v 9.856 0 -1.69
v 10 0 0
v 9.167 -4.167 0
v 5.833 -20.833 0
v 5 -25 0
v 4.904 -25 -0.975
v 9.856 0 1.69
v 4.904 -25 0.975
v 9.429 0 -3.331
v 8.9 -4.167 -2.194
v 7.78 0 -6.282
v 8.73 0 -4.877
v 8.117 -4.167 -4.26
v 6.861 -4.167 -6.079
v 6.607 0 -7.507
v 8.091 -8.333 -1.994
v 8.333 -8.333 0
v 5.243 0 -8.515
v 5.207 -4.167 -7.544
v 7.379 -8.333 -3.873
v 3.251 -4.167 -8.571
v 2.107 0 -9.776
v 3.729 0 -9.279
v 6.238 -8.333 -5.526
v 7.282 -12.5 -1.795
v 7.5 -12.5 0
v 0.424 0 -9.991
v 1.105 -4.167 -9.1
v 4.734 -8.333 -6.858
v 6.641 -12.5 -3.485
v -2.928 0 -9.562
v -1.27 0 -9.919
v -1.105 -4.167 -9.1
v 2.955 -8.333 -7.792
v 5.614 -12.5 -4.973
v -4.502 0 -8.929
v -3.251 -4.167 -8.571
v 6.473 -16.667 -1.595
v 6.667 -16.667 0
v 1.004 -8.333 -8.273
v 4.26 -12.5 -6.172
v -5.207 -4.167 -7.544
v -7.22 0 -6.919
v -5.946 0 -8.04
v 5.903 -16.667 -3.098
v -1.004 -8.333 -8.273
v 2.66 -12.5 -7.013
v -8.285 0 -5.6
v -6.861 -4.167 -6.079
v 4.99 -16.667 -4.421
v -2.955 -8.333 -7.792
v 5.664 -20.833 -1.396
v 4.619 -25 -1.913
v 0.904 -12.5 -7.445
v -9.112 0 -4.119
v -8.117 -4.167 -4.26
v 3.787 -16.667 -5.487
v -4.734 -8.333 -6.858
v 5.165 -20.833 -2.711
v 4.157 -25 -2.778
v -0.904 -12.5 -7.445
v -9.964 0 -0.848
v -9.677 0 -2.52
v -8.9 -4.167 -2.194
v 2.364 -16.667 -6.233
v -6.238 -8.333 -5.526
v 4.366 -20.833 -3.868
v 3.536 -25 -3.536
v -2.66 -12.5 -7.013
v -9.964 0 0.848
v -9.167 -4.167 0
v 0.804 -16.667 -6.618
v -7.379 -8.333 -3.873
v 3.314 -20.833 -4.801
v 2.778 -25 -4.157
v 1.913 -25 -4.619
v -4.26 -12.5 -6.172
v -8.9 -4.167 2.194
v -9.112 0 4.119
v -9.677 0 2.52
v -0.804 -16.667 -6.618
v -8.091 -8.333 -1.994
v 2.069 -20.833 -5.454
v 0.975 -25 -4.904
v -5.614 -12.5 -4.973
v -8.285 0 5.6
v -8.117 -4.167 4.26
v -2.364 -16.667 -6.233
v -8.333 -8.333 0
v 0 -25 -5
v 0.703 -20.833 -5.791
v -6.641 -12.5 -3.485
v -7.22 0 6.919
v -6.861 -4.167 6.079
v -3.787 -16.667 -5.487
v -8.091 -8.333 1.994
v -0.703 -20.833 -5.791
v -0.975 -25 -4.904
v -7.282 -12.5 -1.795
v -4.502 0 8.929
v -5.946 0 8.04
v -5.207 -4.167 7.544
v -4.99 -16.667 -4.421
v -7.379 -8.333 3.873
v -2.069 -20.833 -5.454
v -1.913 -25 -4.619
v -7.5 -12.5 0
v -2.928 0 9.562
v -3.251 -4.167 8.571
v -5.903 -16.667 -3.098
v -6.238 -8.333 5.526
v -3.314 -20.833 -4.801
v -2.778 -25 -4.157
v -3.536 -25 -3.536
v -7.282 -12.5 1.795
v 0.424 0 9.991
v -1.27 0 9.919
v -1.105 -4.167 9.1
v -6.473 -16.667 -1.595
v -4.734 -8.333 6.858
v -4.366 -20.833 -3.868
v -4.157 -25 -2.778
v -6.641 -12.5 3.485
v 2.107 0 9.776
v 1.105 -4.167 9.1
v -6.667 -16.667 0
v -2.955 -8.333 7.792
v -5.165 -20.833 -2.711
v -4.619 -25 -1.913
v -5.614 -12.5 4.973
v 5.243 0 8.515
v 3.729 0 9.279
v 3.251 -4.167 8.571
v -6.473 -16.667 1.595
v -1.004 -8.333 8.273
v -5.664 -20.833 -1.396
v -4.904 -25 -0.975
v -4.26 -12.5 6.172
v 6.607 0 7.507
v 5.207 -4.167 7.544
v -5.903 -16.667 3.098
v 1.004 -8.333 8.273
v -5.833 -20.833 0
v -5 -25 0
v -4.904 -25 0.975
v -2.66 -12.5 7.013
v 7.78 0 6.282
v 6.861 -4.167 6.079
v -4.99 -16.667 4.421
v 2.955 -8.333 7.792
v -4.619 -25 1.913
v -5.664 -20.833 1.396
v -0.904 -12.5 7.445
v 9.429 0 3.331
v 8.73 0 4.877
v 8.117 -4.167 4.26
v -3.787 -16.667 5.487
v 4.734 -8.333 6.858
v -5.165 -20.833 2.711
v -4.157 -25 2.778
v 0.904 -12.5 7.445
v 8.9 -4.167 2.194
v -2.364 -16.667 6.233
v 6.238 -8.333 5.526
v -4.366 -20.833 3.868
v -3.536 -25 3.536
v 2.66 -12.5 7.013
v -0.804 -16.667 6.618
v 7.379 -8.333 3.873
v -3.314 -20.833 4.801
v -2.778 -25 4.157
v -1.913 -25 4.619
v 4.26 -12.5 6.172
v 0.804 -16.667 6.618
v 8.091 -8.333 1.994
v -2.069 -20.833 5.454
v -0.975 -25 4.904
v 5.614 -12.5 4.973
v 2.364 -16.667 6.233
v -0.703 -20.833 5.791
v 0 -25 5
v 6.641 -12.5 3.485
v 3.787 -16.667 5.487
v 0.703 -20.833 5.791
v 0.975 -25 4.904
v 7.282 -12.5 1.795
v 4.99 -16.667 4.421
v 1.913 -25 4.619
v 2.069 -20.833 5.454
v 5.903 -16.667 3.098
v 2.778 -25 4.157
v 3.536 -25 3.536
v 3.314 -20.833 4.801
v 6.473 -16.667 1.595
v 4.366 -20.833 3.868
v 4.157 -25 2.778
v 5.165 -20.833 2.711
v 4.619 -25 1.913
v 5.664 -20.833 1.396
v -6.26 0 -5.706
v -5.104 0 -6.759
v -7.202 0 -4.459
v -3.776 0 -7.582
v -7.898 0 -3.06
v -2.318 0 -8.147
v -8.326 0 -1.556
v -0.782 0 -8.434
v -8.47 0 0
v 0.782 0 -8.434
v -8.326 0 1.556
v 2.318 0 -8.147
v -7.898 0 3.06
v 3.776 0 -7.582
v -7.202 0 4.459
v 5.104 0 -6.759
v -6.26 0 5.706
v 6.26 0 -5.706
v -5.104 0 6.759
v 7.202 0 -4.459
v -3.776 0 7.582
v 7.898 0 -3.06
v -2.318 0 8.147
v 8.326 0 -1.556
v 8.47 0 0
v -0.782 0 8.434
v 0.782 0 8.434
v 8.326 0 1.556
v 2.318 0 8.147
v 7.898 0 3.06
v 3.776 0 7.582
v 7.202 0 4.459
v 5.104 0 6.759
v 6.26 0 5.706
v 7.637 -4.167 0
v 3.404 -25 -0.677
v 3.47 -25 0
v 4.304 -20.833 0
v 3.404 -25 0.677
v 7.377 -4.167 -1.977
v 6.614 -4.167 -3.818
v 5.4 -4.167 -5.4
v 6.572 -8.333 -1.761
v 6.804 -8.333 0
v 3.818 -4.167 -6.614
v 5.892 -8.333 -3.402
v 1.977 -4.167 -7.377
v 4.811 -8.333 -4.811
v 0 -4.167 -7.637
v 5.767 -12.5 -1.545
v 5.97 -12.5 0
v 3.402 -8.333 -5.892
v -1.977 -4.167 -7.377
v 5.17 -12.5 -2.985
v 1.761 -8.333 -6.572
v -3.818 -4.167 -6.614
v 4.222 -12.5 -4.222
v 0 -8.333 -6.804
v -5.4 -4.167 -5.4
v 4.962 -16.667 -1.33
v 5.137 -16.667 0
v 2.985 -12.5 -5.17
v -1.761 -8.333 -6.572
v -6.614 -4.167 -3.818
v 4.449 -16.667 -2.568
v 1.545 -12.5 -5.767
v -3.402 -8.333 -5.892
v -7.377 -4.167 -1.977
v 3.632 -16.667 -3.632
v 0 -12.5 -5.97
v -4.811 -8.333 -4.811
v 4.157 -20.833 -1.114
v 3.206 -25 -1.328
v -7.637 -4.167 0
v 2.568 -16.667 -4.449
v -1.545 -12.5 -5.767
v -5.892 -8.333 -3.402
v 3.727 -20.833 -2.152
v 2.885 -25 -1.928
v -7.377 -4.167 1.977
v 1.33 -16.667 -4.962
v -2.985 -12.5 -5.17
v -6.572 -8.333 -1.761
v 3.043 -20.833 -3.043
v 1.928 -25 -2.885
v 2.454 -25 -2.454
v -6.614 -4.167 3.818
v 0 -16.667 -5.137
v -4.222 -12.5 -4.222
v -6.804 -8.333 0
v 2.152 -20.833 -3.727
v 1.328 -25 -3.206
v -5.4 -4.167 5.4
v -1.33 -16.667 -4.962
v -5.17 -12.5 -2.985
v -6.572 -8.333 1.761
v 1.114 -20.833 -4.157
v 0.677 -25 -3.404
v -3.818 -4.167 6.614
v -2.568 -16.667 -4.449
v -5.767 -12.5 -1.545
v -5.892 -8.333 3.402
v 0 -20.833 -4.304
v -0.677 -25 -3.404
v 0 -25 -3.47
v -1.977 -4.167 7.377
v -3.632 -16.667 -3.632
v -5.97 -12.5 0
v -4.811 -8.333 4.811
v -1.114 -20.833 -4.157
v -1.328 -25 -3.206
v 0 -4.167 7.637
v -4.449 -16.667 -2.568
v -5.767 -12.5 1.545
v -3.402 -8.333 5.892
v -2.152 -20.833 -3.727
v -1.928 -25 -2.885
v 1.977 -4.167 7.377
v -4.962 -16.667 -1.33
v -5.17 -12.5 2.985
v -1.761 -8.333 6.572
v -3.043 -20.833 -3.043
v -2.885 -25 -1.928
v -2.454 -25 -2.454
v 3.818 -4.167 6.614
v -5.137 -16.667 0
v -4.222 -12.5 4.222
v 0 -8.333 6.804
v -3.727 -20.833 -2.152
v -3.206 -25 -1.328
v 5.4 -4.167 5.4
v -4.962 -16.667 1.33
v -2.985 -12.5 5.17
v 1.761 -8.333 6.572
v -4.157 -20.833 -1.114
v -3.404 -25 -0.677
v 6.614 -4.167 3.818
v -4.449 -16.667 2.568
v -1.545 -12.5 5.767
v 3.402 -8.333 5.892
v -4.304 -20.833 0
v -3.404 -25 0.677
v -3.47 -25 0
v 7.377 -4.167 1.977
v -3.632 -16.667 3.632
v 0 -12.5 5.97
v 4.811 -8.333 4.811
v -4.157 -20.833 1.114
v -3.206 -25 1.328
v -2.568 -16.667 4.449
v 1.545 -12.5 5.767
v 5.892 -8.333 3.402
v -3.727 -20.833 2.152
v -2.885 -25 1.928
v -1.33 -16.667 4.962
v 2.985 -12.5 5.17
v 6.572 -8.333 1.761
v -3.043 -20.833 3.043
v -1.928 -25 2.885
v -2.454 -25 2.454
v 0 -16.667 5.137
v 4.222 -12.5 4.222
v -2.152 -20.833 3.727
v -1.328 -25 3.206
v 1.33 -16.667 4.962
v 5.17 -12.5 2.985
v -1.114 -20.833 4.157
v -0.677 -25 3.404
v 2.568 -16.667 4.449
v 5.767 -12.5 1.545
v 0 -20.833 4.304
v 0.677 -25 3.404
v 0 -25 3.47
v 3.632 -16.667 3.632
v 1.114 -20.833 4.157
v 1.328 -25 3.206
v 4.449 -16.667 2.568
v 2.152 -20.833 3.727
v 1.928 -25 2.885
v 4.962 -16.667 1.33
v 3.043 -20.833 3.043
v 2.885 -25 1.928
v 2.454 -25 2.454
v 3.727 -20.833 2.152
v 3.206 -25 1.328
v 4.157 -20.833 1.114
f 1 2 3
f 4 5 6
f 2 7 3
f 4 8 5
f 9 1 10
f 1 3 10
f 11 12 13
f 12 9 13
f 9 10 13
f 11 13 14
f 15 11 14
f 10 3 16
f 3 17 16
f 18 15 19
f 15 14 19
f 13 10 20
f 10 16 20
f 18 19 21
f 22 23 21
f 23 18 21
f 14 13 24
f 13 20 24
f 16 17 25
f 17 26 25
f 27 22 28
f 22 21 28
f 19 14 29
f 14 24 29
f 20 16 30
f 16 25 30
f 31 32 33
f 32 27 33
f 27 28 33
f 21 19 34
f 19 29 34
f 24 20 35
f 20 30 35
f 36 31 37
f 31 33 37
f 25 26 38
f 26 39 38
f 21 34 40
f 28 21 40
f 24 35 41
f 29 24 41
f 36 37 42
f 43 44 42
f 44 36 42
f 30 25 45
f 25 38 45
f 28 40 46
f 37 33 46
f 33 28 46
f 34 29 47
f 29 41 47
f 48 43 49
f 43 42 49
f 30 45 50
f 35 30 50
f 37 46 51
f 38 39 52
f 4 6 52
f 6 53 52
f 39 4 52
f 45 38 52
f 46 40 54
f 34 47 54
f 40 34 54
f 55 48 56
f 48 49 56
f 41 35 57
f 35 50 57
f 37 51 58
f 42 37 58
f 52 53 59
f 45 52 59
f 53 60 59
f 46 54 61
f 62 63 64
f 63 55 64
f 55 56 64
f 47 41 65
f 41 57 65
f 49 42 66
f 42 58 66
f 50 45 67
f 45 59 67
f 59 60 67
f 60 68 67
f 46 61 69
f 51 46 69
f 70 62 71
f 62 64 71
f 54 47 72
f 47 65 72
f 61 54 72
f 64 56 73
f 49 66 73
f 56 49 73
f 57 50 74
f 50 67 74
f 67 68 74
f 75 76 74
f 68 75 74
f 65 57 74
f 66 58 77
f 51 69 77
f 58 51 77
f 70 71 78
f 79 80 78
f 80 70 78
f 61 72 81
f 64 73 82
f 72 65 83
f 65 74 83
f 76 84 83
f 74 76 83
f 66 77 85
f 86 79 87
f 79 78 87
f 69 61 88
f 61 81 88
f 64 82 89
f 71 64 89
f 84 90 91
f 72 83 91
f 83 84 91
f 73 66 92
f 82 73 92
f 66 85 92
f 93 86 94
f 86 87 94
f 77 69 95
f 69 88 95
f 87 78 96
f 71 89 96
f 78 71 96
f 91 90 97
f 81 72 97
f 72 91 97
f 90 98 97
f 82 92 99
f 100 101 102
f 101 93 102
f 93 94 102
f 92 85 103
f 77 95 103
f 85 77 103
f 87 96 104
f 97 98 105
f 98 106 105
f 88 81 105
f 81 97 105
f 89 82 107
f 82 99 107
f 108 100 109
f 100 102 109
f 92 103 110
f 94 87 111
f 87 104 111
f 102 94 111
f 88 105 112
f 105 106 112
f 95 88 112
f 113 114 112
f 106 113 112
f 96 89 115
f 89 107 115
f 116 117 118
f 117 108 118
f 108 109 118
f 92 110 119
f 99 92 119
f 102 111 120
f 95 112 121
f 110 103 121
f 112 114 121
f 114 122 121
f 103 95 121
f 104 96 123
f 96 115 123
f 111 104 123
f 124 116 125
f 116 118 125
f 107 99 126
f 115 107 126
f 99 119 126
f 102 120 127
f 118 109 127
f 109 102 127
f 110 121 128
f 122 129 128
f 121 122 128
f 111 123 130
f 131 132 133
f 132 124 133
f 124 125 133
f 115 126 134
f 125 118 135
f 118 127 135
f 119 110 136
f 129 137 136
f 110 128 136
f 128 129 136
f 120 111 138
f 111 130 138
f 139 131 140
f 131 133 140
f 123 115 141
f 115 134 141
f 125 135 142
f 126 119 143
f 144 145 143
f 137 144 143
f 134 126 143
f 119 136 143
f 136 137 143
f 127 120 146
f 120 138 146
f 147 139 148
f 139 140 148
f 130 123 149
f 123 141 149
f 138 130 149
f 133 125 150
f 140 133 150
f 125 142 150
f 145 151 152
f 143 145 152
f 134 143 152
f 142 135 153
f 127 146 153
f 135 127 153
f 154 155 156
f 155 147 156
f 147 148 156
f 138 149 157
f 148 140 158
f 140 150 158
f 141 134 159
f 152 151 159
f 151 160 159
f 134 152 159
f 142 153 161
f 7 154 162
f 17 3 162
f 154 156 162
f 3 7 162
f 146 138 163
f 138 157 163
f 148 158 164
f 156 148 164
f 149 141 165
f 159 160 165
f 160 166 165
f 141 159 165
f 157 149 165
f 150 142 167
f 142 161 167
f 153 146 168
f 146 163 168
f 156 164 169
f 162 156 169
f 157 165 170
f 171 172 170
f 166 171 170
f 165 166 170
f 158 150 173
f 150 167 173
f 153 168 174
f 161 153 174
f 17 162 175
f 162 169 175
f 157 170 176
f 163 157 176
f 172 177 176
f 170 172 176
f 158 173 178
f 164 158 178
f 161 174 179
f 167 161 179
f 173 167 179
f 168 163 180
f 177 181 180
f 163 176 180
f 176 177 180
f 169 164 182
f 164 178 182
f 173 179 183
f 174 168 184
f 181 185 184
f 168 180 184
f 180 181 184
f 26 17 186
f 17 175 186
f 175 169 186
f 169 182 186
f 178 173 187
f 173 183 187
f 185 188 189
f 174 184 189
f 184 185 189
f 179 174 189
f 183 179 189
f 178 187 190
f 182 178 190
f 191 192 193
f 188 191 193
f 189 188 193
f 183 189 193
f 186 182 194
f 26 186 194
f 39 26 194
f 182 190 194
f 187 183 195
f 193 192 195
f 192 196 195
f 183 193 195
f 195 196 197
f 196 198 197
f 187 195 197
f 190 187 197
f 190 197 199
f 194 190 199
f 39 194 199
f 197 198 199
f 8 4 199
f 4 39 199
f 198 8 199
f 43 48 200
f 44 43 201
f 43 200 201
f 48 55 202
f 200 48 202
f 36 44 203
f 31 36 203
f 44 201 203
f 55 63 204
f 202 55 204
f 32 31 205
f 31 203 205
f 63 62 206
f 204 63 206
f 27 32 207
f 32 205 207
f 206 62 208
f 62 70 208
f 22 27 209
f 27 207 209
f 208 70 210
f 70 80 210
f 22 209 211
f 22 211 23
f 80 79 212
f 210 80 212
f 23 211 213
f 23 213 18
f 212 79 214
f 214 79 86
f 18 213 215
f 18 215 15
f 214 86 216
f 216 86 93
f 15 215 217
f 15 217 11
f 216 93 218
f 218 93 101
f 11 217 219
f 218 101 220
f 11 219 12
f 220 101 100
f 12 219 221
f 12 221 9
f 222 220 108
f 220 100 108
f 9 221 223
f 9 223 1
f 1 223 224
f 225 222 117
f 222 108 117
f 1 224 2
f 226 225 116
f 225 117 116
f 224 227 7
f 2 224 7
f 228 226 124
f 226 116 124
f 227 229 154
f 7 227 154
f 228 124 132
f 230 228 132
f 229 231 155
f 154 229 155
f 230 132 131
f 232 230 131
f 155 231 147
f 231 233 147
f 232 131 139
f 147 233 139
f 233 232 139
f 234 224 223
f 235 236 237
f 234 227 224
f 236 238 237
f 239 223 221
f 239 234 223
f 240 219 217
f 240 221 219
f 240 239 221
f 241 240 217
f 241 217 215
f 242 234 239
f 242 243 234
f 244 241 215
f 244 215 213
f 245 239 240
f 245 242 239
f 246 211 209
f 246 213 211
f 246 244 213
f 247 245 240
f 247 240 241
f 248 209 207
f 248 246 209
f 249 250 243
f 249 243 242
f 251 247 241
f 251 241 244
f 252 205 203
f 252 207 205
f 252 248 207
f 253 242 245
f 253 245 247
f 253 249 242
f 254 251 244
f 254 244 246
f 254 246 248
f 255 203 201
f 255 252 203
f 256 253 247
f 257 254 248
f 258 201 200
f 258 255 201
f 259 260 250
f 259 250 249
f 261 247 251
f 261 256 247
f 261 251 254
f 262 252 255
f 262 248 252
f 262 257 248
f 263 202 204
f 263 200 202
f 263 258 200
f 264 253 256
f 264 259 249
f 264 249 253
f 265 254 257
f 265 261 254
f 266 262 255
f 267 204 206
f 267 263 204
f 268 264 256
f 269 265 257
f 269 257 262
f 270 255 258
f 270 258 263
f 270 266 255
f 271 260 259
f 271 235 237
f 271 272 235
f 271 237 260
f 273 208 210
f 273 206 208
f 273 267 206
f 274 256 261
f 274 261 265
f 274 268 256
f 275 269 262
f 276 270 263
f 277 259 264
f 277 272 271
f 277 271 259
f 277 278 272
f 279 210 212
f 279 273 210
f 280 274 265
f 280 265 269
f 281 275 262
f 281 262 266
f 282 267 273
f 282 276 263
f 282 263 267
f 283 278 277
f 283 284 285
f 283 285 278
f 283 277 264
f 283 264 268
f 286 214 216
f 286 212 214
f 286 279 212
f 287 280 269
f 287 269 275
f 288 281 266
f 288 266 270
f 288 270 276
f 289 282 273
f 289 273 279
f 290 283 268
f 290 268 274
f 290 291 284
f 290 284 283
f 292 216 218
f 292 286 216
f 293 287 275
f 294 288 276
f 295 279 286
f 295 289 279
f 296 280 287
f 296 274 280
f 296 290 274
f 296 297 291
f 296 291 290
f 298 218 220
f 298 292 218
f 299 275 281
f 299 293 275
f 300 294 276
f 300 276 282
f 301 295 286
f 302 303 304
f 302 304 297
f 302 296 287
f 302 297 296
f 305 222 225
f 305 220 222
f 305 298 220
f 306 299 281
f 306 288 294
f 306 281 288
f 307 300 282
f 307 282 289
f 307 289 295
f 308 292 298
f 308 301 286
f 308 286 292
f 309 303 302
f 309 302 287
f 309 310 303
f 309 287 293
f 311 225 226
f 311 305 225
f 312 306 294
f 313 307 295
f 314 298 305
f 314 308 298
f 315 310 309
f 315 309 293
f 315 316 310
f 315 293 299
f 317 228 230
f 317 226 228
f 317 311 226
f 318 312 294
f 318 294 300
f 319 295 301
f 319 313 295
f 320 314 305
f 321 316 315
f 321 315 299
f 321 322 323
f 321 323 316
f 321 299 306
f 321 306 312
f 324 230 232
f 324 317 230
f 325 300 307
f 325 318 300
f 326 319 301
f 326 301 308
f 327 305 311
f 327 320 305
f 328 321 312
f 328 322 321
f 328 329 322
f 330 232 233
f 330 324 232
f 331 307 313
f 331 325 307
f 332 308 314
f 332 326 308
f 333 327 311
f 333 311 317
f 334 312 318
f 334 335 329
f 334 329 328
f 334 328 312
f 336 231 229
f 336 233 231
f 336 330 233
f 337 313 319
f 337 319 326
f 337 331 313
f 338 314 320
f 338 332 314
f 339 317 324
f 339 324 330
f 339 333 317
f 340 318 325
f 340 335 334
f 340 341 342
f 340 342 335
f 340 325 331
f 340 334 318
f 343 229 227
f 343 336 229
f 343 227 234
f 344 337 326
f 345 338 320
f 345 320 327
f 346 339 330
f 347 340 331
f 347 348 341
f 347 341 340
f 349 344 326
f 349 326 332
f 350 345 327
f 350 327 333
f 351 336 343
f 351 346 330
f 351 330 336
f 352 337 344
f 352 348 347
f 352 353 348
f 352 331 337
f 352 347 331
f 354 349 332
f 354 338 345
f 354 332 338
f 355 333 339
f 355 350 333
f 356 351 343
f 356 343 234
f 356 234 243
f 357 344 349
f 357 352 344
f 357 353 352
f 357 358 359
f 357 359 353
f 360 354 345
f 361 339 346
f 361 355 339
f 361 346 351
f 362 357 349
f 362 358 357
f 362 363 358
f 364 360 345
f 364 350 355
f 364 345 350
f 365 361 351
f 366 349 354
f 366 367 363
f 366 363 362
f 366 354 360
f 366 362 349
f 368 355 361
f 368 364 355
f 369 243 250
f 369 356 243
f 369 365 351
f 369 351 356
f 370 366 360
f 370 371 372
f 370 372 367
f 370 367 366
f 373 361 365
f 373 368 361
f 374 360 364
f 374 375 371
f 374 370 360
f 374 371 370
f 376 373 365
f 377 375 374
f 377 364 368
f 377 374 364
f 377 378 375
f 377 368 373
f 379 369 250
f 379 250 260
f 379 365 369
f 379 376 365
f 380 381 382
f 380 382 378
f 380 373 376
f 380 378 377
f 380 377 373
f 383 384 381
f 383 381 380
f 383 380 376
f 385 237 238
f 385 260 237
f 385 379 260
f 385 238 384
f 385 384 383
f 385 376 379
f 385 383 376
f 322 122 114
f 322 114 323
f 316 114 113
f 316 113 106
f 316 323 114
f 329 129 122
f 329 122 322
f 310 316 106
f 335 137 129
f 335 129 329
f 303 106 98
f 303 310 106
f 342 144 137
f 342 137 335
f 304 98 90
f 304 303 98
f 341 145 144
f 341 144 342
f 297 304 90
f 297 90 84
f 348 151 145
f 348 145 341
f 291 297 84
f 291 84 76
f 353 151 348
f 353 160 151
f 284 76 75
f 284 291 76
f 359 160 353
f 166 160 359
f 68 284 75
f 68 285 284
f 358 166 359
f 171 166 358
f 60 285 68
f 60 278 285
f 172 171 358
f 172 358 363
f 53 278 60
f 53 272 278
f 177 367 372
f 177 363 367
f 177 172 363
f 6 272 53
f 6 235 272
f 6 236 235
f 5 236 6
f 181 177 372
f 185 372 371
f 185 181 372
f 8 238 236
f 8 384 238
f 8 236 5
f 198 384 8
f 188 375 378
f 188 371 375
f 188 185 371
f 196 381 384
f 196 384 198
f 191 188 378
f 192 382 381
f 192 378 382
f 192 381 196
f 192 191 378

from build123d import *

# Parameters (mm, degrees)
F0_R       = 10
F1_DEPTH   = 25
F1_FACE1_R = 10
F2_R       = 5
F4_T       = -1.5


with BuildPart() as f1:
    # F0 (on Front) → F1 (new body)
    with BuildSketch(Plane.XZ):
        Circle(F0_R)
    extrude(amount=F1_DEPTH)

    # F1_face1 (on face) → F3 section 0
    with BuildSketch(Plane(origin=(0, 0, 0), x_dir=(1, 0, 0), z_dir=(0, 1, 0))):
        Circle(F1_FACE1_R)
    # F2 (on face) → F3 section 1
    with BuildSketch(Plane.XZ.offset(25)):
        Circle(F2_R)
    loft(mode=Mode.INTERSECT)

    # F4
    f4_openings = [f1.faces().sort_by_distance(p)[0] for p in [
        (0, 0, 0),
        (0, -25, 0),
    ]]
    offset(amount=F4_T, openings=f4_openings, kind=Kind.INTERSECTION)


solid = f1.part
